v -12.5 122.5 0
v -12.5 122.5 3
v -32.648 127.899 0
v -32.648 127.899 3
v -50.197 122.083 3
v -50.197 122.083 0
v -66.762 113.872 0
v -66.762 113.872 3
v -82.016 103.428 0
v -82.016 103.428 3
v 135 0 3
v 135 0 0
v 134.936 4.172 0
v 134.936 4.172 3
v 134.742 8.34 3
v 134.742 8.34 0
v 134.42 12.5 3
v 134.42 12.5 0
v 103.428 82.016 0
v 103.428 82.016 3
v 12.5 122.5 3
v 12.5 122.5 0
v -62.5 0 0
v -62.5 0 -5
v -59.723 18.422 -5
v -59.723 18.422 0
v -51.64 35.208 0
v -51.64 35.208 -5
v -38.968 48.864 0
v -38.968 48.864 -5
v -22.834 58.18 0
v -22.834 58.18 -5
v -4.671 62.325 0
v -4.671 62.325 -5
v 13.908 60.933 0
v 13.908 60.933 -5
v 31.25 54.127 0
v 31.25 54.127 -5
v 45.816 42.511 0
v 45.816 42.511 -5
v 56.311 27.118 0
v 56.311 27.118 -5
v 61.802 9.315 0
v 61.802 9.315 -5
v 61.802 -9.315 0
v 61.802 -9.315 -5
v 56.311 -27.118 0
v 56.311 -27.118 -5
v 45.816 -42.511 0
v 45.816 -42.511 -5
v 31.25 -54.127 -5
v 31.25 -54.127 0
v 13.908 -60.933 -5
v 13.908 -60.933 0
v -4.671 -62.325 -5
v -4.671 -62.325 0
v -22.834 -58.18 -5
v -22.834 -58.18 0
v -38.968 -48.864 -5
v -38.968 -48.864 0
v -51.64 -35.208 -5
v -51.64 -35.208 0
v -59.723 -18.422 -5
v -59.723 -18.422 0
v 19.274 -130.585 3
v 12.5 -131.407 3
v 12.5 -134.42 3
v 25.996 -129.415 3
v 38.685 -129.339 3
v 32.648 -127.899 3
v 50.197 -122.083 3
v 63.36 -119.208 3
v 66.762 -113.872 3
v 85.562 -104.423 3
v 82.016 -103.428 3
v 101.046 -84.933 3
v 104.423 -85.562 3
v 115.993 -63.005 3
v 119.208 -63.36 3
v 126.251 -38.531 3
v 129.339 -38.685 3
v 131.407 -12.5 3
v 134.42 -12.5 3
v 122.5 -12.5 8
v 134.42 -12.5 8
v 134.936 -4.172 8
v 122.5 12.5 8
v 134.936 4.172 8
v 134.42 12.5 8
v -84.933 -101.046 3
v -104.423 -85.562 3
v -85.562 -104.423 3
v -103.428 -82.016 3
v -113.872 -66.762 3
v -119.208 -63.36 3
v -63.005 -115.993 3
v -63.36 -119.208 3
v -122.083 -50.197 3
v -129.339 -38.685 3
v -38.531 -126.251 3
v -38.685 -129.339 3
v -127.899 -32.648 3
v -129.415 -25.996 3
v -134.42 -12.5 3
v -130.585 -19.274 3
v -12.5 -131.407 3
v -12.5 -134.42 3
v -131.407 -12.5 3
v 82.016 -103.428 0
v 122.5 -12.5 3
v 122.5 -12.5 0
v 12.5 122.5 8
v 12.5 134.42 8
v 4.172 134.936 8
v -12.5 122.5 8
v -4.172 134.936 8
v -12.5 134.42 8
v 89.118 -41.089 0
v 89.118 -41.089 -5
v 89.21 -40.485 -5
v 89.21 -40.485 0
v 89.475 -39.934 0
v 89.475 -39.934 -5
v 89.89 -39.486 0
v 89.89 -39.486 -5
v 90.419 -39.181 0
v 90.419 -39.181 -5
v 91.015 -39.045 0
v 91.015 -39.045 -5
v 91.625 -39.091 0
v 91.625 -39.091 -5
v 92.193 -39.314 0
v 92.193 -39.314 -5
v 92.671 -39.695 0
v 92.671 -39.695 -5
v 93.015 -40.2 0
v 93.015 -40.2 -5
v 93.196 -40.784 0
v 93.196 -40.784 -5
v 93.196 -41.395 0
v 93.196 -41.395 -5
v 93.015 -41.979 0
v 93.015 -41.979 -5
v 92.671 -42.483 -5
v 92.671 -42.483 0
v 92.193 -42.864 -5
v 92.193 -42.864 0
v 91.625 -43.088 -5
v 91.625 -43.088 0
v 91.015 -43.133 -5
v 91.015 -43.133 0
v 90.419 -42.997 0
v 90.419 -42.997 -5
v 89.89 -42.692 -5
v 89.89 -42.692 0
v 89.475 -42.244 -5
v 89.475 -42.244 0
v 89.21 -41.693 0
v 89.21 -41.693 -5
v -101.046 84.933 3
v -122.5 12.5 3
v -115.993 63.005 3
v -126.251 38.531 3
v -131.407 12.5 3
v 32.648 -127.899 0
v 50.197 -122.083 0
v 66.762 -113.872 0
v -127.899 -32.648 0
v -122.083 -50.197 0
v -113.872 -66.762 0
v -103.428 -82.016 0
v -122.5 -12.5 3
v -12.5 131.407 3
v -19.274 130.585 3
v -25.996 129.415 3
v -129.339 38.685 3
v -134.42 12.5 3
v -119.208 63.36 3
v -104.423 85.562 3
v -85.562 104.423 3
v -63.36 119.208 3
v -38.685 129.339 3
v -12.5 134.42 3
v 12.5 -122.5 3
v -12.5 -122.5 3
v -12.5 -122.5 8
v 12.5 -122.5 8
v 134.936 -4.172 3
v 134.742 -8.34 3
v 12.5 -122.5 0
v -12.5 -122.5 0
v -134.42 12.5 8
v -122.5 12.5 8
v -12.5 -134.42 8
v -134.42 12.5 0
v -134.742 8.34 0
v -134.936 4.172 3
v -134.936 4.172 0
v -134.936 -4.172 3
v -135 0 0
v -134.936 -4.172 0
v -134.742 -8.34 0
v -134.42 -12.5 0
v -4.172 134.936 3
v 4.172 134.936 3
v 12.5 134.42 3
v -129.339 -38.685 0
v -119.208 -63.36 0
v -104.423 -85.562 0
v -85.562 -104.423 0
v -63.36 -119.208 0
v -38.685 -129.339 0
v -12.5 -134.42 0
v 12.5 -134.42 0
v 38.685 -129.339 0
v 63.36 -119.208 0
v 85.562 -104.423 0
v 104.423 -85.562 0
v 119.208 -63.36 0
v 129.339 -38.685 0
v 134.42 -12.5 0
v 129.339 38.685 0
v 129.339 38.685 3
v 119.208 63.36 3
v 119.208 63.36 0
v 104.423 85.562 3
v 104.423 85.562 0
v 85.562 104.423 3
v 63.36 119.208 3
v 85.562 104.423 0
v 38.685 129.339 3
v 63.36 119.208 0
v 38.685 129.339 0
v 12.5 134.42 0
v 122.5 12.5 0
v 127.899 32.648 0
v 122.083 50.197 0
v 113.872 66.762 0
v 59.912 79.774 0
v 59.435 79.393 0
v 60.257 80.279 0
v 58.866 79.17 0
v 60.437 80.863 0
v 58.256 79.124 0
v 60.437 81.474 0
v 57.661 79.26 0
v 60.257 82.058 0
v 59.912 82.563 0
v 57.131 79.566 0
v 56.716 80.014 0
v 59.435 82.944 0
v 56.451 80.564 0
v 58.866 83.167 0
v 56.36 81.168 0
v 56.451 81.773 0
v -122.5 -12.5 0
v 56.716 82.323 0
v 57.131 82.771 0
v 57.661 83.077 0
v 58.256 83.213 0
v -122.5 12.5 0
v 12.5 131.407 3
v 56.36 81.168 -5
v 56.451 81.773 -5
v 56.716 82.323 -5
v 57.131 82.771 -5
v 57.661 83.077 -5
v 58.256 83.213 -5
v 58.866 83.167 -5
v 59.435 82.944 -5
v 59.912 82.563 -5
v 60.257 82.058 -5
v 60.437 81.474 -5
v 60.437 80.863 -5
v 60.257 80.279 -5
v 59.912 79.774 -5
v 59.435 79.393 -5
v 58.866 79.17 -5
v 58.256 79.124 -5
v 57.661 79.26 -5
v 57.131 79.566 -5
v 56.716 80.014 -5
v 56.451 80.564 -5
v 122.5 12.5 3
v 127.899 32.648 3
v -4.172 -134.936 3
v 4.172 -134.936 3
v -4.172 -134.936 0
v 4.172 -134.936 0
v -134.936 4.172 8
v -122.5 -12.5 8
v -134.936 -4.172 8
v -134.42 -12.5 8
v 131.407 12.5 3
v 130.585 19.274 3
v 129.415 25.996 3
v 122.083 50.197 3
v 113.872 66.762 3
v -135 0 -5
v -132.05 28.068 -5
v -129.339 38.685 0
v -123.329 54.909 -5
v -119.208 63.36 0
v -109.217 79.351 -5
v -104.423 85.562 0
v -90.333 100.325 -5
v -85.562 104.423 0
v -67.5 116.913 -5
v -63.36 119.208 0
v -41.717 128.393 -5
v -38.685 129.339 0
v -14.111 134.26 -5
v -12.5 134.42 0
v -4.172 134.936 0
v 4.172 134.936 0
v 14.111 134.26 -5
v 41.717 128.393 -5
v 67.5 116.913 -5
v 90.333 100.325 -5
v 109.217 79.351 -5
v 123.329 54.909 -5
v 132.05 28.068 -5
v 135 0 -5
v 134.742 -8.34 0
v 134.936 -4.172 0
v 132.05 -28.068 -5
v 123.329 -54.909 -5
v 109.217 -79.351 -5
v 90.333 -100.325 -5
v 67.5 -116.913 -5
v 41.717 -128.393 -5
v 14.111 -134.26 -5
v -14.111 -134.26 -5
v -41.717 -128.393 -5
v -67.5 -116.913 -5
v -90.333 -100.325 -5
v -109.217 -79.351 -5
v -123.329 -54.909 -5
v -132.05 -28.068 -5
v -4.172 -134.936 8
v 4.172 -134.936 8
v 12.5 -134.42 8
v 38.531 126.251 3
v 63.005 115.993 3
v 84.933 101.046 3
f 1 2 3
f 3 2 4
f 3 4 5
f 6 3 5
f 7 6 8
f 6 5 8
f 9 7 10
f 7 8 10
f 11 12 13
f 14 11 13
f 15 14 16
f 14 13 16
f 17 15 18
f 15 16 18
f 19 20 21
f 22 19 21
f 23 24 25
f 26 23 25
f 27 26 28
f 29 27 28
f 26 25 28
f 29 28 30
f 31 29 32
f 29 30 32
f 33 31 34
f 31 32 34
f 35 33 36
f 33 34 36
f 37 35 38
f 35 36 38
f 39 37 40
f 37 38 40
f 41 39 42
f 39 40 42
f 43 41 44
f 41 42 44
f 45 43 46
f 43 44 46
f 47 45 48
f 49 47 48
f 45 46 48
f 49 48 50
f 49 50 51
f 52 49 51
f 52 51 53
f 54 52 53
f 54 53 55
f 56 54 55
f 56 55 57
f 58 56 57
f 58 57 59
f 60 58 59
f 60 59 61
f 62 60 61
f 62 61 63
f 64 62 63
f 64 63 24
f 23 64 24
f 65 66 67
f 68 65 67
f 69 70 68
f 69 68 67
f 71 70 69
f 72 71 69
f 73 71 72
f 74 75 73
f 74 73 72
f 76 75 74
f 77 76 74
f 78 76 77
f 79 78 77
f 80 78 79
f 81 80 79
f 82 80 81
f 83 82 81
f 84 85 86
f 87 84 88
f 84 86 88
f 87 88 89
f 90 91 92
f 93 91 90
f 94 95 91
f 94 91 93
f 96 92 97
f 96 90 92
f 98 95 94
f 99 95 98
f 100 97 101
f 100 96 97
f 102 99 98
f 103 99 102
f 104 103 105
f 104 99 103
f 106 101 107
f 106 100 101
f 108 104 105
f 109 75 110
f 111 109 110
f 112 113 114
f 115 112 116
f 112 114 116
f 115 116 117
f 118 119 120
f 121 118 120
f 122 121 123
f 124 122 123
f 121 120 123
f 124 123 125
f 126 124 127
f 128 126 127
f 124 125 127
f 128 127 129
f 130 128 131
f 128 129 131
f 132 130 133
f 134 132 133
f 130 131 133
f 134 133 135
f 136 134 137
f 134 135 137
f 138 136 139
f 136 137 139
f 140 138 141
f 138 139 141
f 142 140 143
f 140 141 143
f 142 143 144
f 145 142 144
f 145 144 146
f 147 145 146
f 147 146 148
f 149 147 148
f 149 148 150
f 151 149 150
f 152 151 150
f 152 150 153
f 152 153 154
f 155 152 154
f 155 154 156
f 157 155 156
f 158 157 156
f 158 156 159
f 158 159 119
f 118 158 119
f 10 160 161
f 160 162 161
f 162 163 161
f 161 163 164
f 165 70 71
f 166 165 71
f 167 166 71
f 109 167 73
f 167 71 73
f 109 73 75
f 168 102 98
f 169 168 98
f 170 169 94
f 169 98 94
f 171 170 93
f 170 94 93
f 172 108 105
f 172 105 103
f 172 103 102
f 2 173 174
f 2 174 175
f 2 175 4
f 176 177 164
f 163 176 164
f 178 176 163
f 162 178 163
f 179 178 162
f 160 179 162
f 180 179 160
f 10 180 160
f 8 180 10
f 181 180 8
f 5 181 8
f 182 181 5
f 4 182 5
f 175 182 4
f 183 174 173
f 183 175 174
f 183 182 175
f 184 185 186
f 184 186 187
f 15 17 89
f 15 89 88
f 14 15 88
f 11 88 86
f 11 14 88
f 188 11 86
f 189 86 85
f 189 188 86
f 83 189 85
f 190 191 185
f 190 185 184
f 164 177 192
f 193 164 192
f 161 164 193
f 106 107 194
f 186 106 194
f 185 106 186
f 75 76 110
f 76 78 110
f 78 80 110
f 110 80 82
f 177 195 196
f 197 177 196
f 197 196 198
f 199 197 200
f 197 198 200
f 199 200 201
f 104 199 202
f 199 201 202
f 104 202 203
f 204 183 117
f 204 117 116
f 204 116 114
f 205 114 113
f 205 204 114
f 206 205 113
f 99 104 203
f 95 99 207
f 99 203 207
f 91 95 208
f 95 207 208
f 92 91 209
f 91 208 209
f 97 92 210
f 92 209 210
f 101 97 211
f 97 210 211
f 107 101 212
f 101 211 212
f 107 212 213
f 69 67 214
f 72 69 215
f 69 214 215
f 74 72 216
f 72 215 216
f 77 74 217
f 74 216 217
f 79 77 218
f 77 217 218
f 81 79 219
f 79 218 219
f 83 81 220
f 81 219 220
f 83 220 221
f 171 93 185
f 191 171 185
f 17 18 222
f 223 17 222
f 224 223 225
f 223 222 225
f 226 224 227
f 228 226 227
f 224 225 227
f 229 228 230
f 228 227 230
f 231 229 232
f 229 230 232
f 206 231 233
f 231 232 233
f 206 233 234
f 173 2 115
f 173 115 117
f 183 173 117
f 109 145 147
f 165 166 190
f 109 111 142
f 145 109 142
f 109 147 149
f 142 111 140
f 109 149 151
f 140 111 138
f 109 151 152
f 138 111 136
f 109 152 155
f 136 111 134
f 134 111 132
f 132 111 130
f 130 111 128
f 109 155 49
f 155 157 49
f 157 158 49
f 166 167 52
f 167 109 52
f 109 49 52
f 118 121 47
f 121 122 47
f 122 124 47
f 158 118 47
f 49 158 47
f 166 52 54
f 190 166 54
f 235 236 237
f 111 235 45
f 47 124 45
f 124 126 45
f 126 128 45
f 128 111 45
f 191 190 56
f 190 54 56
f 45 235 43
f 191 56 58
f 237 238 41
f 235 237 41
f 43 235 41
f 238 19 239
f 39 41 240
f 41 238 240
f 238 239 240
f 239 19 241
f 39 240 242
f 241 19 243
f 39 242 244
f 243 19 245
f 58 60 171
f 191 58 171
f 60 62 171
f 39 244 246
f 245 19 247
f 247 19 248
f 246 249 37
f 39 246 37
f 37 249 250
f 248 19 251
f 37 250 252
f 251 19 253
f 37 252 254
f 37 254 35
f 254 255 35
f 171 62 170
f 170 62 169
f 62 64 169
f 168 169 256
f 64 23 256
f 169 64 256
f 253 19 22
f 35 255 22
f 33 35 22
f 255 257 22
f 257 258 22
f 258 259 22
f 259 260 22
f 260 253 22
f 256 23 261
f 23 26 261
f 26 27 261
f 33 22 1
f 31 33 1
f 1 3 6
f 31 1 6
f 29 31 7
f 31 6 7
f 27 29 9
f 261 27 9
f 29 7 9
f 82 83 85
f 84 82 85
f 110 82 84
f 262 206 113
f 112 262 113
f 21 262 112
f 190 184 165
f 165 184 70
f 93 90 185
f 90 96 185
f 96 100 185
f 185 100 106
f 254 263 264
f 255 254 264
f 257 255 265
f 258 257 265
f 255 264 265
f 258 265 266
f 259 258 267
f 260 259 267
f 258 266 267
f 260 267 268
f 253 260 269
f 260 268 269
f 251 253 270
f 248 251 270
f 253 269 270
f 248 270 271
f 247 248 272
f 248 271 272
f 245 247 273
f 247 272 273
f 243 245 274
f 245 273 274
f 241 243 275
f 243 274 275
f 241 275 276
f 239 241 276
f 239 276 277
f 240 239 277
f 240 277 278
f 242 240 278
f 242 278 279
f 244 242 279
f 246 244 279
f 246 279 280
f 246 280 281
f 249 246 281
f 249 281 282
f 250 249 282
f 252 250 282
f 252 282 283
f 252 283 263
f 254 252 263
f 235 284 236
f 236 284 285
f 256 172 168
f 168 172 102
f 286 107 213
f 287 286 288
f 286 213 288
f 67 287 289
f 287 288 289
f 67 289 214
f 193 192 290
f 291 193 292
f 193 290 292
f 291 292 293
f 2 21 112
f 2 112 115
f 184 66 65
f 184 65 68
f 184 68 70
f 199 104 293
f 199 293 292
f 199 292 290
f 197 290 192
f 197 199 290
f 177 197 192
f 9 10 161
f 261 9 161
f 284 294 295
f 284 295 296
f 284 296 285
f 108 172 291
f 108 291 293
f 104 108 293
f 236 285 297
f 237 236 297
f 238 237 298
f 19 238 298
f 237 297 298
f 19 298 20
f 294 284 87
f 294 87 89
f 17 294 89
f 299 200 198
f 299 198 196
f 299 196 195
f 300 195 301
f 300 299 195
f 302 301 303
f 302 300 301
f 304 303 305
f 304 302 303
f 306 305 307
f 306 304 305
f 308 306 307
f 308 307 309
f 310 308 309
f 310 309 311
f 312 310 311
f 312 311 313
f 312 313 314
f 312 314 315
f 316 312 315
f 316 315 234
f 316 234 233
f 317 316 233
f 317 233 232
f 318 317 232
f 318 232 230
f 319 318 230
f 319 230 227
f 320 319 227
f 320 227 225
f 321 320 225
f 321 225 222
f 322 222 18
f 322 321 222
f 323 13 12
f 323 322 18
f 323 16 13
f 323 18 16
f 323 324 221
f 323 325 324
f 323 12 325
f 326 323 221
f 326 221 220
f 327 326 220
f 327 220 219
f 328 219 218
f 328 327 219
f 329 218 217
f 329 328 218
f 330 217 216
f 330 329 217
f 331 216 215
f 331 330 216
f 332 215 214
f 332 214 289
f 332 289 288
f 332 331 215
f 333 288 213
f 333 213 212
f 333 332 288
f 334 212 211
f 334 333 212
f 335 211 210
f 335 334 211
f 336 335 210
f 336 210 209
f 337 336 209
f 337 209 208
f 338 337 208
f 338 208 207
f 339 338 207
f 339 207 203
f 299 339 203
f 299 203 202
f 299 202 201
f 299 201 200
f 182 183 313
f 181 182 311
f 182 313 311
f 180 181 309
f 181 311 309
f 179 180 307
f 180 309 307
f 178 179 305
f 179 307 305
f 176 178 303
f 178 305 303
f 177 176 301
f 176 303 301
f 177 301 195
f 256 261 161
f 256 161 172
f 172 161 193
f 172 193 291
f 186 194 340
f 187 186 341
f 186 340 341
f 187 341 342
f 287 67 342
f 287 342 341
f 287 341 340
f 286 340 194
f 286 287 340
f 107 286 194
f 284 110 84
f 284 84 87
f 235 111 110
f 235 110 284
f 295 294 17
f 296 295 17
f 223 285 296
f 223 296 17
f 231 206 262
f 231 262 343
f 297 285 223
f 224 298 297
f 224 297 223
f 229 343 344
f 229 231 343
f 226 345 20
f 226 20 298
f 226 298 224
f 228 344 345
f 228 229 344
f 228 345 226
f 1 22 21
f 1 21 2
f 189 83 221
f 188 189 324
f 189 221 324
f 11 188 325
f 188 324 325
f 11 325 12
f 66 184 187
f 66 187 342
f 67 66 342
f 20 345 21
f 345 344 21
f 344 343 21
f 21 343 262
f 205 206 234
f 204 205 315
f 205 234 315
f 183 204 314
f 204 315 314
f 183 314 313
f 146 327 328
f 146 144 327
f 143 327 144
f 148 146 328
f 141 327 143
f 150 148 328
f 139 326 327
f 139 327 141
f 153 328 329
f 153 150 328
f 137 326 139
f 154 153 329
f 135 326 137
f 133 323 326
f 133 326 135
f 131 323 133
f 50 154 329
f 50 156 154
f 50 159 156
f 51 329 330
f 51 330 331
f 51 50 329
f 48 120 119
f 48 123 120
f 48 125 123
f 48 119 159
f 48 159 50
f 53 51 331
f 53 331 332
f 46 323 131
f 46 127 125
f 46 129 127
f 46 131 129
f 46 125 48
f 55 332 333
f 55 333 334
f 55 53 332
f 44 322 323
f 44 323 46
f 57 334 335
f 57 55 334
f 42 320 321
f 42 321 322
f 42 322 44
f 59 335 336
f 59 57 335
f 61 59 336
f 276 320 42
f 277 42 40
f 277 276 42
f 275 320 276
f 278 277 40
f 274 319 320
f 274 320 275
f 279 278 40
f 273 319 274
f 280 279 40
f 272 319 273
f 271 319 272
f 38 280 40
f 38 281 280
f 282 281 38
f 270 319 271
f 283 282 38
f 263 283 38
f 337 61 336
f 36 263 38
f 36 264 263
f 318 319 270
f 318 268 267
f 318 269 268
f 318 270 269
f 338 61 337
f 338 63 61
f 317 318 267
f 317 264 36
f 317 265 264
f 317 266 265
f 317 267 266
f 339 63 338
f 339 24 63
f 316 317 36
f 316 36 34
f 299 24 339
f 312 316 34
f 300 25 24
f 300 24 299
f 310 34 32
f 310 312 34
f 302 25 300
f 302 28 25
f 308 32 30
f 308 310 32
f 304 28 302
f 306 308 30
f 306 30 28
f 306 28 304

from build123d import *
from build123d.topology import SkipClean

# Parameters (mm, degrees)
SCHIZZO1_R                   = 135
ESTRUSIONE_ESTRUSIONE2_DEPTH = 3
SCHIZZO4_R                   = 132
TAGLIO_ESTRUSIONE1_DEPTH     = 191.942399692
ESTRUSIONE_ESTRUSIONE3_DEPTH = 8
RIPETIZIONECIRCOLARE2_COUNT  = 4
ESTRUSIONE_ESTRUSIONE5_START = -3
ESTRUSIONE_ESTRUSIONE5_DEPTH = 3
RIPETIZIONECIRCOLARE4_COUNT  = 4
ESTRUSIONE_ESTRUSIONE6_START = 5
SCHIZZO9_R                   = 135
ESTRUSIONE_ESTRUSIONE6_DEPTH = 5
SCHIZZO10_R                  = 62.5
TAGLIO_ESTRUSIONE2_DEPTH     = 10
SCHIZZO11_R                  = 2.05
TAGLIO_ESTRUSIONE3_DEPTH     = 10


with BuildPart() as part:
    # Schizzo1 → Estrusione-Estrusione2 (new body)
    with BuildSketch(Plane.XY):
        Circle(SCHIZZO1_R)
    extrude(amount=ESTRUSIONE_ESTRUSIONE2_DEPTH)

    # Schizzo4 → Taglio-Estrusione1 (cut, through all)
    with BuildSketch(Plane.XY.offset(3)):
        Circle(SCHIZZO4_R)
    extrude(amount=-TAGLIO_ESTRUSIONE1_DEPTH, mode=Mode.SUBTRACT)

    # Schizzo5 → Estrusione-Estrusione3 (add)
    with SkipClean():  # the faces are left unmerged after this step: merging them gives an invalid solid
        with BuildSketch(Plane(origin=(0, 0, 0), x_dir=(-1, 0, 0), z_dir=(0, 0, -1))):
            with BuildLine():
                Line((-12.5, 134.420050588), (-12.5, 122.5))
                Line((-12.5, 122.5), (12.5, 122.5))
                Line((12.5, 122.5), (12.5, 134.420050588))
                ThreePointArc((12.5, 134.420050588), (0, 135), (-12.5, 134.420050588))
            make_face()
        estrusione_estrusione3 = extrude(amount=-ESTRUSIONE_ESTRUSIONE3_DEPTH)

    # RipetizioneCircolare2: Estrusione-Estrusione3 ×4 about axis
    with SkipClean():  # the faces are left unmerged after this step: merging them gives an invalid solid
        ripetizionecircolare2_axis = Axis((0, 0, 0), (0, 0, 1))
        for i in range(1, RIPETIZIONECIRCOLARE2_COUNT):
            add(estrusione_estrusione3.rotate(ripetizionecircolare2_axis, i * 360 / RIPETIZIONECIRCOLARE2_COUNT))

    # Schizzo8 → Estrusione-Estrusione5 (add)
    with SkipClean():  # the faces are left unmerged after this step: merging them gives an invalid solid
        with BuildSketch(Plane(origin=(0, 0, 0), x_dir=(-1, 0, 0), z_dir=(0, 0, -1)).offset(ESTRUSIONE_ESTRUSIONE5_START)):
            with BuildLine():
                Line((-12.5, 122.5), (12.5, 122.5))
                Line((12.5, 122.5), (32.648342939, 127.898732219))
                ThreePointArc((32.648342939, 127.898732219), (-42.175054348, 125.081032898), (-103.427881869, 82.016298697))
                Line((-103.427881869, 82.016298697), (-12.5, 122.5))
            make_face()
        estrusione_estrusione5 = extrude(amount=ESTRUSIONE_ESTRUSIONE5_DEPTH)

    # RipetizioneCircolare4: Estrusione-Estrusione5 ×4 about axis
    with SkipClean():  # the faces are left unmerged after this step: merging them gives an invalid solid
        ripetizionecircolare4_axis = Axis((0, 0, 0), (0, 0, 1))
        for i in range(1, RIPETIZIONECIRCOLARE4_COUNT):
            add(estrusione_estrusione5.rotate(ripetizionecircolare4_axis, i * 360 / RIPETIZIONECIRCOLARE4_COUNT))

    # Schizzo9 → Estrusione-Estrusione6 (add)
    with SkipClean():  # the faces are left unmerged after this step: merging them gives an invalid solid
        with BuildSketch(Plane(origin=(0, 0, 0), x_dir=(-1, 0, 0), z_dir=(0, 0, -1)).offset(ESTRUSIONE_ESTRUSIONE6_START)):
            Circle(SCHIZZO9_R)
        extrude(amount=-ESTRUSIONE_ESTRUSIONE6_DEPTH)

    # Schizzo10 → Taglio-Estrusione2 (cut)
    with SkipClean():  # the faces are left unmerged after this step: merging them gives an invalid solid
        with BuildSketch(Plane(origin=(0, 0, -5), x_dir=(-1, 0, 0), z_dir=(0, 0, -1))):
            Circle(SCHIZZO10_R)
        extrude(amount=-TAGLIO_ESTRUSIONE2_DEPTH, mode=Mode.SUBTRACT)

    # Schizzo11 → Taglio-Estrusione3 (cut)
    with SkipClean():  # the faces are left unmerged after this step: merging them gives an invalid solid
        with BuildSketch(Plane(origin=(0, 0, -5), x_dir=(-1, 0, 0), z_dir=(0, 0, -1))):
            with Locations((-91.168439698, -41.089117817)):
                Circle(SCHIZZO11_R)
            with Locations((-58.409625893, 81.168439698)):
                Circle(SCHIZZO11_R)
        extrude(amount=-TAGLIO_ESTRUSIONE3_DEPTH, mode=Mode.SUBTRACT)


solid = part.part
